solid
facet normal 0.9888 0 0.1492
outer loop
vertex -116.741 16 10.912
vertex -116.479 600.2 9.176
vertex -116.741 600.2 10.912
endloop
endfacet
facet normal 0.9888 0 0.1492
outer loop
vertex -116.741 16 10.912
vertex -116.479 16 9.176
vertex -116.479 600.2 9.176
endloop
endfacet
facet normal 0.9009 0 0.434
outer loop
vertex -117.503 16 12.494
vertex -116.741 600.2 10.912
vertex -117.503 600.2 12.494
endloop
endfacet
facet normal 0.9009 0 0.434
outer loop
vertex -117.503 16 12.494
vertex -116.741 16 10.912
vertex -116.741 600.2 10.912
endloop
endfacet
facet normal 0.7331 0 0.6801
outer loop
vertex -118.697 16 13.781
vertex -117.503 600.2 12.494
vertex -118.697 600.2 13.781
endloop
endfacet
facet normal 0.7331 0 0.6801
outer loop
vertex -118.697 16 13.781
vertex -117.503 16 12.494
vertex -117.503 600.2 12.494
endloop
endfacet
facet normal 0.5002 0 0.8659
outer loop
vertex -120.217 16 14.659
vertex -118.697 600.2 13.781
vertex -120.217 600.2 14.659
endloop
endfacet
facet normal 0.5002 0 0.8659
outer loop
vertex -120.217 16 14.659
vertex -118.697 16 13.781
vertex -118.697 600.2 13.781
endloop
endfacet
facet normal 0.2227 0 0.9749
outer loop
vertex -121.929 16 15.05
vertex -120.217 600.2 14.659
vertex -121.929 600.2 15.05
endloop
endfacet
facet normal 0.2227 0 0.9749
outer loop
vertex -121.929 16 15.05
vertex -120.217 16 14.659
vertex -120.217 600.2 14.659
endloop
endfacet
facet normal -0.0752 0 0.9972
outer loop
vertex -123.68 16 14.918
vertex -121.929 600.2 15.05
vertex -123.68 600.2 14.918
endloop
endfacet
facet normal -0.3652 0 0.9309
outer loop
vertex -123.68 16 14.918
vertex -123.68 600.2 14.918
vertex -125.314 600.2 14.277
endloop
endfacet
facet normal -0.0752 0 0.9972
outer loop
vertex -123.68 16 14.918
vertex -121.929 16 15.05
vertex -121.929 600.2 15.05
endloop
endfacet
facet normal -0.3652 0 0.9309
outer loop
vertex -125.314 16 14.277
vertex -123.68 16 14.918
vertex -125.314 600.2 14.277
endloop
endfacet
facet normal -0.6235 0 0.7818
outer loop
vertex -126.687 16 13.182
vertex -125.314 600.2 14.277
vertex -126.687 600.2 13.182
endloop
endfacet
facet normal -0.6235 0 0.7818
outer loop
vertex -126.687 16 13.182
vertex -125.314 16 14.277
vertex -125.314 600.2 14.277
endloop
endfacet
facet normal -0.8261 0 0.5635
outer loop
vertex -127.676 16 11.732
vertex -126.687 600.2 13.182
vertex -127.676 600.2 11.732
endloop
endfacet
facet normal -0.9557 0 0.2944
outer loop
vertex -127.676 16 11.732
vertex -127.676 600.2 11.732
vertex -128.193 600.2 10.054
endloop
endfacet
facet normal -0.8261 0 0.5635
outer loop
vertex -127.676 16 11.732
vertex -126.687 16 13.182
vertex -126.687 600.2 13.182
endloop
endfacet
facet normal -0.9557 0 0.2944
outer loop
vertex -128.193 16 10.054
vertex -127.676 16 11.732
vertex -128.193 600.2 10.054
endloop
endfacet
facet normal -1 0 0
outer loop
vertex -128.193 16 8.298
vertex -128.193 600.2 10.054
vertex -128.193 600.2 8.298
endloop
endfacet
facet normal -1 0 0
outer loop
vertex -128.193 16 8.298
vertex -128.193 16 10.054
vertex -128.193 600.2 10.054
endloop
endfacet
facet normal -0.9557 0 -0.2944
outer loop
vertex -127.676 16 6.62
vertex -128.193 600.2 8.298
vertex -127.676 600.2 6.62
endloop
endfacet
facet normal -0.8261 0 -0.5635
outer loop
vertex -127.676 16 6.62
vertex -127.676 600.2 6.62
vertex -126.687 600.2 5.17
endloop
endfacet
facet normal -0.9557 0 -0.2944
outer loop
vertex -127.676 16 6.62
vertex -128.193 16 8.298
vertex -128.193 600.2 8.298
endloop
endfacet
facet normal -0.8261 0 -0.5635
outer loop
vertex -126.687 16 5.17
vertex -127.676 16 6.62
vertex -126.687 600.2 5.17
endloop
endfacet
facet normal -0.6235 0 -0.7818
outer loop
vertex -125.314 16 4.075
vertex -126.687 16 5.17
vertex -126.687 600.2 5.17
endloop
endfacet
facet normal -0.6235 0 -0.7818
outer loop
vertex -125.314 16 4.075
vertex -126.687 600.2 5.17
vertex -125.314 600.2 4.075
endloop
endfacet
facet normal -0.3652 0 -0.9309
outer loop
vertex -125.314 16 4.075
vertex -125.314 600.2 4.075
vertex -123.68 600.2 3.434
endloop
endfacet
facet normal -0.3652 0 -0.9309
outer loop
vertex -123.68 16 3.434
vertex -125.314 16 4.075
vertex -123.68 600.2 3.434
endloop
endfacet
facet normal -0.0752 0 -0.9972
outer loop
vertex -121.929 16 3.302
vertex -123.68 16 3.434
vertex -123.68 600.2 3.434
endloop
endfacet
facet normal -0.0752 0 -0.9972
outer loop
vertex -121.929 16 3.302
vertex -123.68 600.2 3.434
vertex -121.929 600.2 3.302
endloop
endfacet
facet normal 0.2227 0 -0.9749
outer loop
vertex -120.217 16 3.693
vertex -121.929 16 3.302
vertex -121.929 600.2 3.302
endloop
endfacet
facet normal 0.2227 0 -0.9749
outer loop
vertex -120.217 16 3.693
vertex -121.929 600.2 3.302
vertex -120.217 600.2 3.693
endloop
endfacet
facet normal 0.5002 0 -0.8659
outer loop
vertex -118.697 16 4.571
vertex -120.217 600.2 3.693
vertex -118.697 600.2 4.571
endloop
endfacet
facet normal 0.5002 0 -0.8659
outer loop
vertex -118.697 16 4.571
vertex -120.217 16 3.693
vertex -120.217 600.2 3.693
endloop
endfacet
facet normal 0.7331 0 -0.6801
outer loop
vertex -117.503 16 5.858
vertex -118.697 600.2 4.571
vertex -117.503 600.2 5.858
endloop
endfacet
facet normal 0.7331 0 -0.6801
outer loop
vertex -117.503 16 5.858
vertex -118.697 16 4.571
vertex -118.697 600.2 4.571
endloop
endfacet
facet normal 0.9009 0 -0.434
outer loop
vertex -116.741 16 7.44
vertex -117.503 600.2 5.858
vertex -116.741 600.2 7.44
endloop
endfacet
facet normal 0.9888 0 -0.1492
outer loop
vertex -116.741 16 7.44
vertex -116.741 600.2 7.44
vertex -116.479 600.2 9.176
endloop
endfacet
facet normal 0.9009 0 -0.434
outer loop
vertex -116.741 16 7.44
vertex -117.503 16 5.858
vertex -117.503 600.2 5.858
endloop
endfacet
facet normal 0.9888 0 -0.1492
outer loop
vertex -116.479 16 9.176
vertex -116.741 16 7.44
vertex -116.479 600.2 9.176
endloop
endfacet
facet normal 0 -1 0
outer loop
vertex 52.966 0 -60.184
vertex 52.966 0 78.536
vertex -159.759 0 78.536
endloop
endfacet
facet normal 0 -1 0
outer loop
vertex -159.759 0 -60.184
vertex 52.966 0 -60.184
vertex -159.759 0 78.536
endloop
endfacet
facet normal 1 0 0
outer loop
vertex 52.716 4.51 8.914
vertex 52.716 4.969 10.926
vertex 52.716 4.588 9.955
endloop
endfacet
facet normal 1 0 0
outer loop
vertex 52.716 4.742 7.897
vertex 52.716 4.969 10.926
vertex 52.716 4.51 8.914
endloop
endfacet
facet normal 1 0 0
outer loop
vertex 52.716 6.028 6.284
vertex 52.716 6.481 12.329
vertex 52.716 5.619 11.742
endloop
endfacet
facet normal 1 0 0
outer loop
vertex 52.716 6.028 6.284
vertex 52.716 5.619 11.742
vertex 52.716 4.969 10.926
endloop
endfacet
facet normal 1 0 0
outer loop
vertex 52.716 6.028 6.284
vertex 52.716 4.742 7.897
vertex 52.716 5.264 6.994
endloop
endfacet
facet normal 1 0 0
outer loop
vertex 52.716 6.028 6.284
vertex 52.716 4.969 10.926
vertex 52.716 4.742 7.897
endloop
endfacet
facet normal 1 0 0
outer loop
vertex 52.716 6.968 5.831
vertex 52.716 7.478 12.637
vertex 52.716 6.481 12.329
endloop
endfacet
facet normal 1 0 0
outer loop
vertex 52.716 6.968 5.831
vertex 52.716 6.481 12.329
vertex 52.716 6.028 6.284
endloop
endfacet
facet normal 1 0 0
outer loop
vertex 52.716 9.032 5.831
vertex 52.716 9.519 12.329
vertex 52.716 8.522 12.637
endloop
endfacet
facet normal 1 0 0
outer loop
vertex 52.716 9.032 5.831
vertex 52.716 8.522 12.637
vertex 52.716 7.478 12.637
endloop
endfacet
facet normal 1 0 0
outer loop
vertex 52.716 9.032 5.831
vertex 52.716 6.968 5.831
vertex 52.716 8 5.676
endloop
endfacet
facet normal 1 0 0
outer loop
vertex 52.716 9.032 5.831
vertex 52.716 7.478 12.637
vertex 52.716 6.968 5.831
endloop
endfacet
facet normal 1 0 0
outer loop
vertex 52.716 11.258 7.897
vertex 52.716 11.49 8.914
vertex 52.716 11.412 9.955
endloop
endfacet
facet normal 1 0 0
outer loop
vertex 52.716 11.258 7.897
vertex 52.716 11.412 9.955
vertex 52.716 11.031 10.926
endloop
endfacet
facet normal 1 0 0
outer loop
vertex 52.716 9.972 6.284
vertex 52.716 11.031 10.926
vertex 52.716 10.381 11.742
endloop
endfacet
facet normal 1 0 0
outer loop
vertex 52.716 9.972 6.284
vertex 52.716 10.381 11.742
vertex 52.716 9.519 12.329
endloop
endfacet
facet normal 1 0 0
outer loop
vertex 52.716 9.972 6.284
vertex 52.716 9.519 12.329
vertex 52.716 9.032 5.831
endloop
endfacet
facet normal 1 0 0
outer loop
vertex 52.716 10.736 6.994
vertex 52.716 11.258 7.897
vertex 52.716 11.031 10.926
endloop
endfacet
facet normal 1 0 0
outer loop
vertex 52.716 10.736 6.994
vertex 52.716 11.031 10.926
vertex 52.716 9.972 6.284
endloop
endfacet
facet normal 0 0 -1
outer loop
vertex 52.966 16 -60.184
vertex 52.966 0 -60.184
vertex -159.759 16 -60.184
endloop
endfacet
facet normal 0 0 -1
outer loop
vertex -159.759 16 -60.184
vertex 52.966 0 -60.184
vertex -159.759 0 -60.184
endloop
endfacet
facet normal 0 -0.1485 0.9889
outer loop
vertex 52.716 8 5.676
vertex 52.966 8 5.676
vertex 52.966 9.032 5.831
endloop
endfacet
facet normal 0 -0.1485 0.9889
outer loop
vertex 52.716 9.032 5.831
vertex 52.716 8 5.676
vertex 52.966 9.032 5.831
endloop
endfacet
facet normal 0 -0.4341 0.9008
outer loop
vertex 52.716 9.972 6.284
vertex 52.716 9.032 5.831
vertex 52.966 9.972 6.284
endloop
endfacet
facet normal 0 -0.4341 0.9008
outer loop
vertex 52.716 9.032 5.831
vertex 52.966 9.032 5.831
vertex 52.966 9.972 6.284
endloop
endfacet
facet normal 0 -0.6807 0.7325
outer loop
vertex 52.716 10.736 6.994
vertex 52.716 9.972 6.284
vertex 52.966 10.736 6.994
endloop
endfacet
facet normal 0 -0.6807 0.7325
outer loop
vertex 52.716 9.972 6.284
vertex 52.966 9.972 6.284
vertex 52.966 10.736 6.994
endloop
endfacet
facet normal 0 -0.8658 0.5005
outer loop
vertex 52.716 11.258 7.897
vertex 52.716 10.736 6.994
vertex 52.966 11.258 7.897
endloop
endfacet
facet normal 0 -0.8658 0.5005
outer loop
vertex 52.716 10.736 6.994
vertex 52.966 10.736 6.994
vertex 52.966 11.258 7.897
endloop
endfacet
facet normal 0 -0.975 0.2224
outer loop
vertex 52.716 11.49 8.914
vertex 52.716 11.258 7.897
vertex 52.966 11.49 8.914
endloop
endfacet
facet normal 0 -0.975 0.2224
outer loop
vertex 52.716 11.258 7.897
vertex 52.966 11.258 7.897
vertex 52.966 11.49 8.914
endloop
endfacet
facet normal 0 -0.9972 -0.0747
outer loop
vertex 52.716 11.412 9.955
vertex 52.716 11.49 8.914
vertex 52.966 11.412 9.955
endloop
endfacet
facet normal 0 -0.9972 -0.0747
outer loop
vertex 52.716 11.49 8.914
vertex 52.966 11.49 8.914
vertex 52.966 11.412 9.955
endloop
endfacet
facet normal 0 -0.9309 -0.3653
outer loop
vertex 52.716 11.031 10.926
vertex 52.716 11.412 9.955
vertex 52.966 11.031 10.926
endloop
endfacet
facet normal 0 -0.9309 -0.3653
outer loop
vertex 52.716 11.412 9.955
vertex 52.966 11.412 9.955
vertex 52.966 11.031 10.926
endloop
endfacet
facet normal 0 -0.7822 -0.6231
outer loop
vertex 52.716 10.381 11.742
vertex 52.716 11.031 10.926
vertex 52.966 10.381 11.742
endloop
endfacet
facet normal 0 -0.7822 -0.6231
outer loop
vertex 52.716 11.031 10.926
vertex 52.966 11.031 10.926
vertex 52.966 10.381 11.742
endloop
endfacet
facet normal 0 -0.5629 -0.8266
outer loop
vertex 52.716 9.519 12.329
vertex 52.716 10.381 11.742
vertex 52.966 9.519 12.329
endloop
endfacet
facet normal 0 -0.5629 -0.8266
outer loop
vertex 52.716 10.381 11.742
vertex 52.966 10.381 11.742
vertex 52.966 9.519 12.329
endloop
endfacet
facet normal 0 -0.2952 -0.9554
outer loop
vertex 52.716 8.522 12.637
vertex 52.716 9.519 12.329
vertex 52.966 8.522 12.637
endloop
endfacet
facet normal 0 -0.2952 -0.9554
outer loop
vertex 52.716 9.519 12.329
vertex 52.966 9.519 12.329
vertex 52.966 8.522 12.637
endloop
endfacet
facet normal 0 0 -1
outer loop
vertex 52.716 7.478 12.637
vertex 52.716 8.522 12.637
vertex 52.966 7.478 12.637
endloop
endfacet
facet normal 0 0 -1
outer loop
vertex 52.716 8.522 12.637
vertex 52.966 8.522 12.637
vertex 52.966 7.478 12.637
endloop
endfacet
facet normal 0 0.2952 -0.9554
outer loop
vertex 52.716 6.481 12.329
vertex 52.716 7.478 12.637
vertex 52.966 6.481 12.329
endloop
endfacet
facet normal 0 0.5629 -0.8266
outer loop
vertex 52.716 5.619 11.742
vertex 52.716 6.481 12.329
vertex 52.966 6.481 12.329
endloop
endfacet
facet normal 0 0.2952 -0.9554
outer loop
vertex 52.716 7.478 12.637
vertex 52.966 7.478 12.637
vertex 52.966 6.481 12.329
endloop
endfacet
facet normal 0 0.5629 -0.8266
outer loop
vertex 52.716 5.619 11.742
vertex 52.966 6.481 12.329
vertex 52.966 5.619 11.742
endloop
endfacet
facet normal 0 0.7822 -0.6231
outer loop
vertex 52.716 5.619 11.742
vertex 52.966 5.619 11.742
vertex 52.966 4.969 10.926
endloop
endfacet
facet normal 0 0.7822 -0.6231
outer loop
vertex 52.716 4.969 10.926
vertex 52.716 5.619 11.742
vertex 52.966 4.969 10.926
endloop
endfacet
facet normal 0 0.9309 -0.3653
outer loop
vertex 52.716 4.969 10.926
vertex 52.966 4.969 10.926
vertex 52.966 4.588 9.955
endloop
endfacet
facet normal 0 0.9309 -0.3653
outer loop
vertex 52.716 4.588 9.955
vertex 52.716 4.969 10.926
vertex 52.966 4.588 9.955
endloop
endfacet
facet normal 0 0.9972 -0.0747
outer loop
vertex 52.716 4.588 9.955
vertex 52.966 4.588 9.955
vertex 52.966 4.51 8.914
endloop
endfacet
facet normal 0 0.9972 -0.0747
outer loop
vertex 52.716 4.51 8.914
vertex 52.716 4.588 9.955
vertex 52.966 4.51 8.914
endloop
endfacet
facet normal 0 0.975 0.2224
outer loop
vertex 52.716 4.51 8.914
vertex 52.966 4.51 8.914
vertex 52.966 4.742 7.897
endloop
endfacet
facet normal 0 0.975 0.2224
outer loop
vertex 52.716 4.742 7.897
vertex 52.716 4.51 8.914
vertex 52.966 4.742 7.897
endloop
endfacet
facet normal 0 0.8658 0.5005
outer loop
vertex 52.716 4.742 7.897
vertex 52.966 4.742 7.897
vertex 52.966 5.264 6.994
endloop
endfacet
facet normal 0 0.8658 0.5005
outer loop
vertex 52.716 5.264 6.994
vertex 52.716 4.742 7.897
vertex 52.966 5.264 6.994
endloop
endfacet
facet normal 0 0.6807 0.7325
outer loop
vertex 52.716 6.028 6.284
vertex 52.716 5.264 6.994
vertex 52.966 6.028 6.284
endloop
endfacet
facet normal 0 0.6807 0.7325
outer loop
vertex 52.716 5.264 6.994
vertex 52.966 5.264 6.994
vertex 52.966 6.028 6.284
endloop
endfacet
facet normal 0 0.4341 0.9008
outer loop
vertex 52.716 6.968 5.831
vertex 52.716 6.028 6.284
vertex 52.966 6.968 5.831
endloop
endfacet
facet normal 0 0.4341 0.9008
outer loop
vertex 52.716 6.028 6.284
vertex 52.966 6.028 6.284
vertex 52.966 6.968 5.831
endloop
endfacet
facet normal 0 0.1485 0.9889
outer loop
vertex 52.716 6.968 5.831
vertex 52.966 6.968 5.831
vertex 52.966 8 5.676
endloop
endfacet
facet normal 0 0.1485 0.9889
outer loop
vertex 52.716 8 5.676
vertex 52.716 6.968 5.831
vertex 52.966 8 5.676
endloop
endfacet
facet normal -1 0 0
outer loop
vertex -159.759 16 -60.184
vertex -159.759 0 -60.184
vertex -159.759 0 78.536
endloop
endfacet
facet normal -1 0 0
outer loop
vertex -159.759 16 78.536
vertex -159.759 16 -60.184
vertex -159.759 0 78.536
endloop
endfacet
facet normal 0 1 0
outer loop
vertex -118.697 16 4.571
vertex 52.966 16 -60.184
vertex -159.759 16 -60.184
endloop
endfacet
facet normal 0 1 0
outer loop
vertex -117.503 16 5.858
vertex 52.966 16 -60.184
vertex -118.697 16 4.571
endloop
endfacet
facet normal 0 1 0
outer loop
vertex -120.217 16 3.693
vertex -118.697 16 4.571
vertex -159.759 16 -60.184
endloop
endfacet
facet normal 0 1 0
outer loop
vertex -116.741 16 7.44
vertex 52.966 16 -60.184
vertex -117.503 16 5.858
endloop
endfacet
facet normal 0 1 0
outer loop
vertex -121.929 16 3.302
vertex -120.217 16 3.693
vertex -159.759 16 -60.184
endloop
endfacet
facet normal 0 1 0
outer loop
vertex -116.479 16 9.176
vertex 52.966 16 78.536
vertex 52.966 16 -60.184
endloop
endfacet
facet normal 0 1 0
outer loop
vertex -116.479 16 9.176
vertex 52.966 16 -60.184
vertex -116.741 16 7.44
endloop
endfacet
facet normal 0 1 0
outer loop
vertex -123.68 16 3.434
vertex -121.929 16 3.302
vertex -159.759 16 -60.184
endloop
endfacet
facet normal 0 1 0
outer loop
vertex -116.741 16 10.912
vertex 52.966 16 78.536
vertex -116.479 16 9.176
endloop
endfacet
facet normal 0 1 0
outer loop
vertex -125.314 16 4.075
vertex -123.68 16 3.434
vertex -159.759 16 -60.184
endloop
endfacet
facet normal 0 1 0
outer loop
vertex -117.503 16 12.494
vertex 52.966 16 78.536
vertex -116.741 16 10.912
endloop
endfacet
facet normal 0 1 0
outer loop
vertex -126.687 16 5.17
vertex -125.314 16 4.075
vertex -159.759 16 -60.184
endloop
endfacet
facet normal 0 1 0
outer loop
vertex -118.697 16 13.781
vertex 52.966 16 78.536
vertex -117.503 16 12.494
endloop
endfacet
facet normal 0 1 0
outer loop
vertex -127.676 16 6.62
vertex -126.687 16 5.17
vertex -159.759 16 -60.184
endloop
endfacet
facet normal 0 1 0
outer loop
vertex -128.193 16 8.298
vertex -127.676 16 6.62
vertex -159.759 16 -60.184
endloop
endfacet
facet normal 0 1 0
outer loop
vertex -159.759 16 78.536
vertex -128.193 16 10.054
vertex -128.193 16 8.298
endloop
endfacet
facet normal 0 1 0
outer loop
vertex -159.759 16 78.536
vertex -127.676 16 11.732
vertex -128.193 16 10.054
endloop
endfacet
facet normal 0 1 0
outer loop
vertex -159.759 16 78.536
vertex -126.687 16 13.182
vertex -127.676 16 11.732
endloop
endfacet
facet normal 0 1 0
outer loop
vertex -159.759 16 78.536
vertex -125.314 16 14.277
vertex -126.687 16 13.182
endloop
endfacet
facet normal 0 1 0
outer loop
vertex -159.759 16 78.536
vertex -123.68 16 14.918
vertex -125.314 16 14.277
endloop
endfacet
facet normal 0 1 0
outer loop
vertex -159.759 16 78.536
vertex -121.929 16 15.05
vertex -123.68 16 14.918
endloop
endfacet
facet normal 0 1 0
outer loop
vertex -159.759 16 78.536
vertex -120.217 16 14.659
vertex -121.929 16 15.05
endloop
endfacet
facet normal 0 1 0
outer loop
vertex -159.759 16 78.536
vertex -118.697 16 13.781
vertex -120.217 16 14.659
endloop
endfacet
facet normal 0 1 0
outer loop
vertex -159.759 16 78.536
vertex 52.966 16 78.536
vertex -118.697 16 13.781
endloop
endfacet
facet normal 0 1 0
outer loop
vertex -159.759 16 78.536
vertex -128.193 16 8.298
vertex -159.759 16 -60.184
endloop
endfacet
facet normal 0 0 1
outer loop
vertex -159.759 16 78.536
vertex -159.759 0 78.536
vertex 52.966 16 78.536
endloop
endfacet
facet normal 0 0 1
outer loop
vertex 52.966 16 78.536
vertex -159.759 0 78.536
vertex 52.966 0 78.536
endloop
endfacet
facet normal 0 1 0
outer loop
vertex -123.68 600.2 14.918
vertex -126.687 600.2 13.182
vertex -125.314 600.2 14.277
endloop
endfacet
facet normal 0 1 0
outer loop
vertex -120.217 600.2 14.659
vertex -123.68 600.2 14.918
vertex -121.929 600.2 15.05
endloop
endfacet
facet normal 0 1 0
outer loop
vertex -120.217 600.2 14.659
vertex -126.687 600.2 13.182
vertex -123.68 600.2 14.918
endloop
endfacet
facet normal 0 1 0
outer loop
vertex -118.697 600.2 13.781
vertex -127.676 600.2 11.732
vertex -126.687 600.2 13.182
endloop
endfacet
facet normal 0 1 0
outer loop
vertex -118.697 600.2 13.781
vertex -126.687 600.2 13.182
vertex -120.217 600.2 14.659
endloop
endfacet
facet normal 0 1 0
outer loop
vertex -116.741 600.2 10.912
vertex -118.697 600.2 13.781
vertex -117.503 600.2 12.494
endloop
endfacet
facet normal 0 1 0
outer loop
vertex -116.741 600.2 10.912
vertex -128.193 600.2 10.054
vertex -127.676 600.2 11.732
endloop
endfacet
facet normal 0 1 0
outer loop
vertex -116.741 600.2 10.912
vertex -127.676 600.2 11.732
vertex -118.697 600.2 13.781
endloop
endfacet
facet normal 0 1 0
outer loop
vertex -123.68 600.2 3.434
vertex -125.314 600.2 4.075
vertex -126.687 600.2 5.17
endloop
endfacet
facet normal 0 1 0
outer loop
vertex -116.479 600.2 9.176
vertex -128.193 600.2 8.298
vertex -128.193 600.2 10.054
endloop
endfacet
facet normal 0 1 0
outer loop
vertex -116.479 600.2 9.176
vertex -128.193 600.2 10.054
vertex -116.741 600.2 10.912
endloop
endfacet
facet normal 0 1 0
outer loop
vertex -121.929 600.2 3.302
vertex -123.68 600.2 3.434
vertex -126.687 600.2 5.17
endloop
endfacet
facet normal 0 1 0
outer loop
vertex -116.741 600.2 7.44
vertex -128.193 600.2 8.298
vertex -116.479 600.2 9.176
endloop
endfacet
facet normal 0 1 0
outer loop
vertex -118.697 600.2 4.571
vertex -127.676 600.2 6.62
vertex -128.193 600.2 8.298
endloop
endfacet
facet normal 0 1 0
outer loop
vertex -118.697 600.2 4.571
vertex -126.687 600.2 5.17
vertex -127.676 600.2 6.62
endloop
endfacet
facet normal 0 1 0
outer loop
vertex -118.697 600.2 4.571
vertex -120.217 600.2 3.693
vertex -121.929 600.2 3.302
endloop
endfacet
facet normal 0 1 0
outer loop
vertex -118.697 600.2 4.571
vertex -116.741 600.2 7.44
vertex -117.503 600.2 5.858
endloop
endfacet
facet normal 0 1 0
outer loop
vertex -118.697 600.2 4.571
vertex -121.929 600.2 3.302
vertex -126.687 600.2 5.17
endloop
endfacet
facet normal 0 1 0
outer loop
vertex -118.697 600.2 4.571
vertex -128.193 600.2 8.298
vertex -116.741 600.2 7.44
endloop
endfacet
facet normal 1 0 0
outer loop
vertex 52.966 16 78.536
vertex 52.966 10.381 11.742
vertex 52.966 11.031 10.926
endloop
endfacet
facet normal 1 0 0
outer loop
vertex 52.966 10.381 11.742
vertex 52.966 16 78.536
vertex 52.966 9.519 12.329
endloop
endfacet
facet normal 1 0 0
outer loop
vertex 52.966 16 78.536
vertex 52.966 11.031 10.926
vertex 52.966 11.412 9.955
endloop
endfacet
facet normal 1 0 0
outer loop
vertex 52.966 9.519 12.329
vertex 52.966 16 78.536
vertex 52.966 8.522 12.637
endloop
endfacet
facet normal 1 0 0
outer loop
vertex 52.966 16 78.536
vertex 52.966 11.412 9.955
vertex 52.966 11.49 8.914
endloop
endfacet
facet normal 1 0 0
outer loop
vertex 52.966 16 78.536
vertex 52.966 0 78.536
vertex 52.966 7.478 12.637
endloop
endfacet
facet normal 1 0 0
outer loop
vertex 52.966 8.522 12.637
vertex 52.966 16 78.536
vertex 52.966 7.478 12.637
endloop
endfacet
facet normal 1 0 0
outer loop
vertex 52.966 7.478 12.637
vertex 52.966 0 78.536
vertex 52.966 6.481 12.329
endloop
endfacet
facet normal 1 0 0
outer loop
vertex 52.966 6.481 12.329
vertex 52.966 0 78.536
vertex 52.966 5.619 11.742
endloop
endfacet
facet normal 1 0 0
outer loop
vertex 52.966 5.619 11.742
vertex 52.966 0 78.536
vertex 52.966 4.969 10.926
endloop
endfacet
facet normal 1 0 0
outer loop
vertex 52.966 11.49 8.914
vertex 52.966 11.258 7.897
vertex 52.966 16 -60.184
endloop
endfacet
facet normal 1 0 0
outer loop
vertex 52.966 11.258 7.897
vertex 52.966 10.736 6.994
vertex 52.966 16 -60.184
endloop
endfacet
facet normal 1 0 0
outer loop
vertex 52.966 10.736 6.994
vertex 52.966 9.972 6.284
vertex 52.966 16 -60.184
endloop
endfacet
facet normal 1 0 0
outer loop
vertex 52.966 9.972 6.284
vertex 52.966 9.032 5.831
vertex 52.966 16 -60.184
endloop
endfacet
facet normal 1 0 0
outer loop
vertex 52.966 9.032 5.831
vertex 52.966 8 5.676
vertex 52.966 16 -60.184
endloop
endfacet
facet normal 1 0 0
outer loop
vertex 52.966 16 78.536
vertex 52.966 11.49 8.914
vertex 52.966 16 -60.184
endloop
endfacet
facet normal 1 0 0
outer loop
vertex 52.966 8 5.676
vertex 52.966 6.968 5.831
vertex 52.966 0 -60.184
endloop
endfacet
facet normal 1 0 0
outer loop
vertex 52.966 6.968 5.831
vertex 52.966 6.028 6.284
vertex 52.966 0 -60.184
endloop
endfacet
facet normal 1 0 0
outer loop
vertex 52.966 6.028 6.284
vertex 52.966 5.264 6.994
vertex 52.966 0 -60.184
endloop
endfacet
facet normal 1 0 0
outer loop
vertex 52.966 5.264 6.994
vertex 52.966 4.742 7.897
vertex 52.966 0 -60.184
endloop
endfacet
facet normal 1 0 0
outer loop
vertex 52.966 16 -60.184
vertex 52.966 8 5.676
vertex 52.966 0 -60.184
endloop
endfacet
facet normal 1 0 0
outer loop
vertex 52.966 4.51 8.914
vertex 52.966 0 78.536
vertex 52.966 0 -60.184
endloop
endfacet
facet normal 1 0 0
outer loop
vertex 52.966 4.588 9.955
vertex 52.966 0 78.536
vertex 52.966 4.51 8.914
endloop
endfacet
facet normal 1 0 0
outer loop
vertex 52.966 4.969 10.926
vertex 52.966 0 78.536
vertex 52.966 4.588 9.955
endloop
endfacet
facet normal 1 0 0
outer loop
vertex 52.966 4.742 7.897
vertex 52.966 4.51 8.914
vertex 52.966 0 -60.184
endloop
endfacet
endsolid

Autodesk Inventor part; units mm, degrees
ref_plane "YZ Plane" through (0, 0, 0) normal (1, 0, 0) x (0, 1, 0)
ref_plane "XZ Plane" through (0, 0, 0) normal (0, 1, 0) x (-1, 0, 0)
ref_plane "XY Plane" through (0, 0, 0) normal (0, 0, 1) x (1, 0, 0)
sketch "Sketch1" plane through (0, 0, 0) normal (0, 1, 0) x (-1, 0, 0)
  line L0 (159.7591, 78.536) -> (-52.9659, 78.536)
  line L1 (-52.9659, 78.536) -> (-52.9659, -60.184)
  line L2 (-52.9659, -60.184) -> (159.7591, -60.184)
  line L3 (159.7591, -60.184) -> (159.7591, 78.536)
  point P0 (0, 0)
  dimension "d0" = 138.72
  dimension "d1" = 212.725
extrude "Extrusion1" add sketch "Sketch1" along normal blind 16
sketch "Sketch2" plane through (0, 16, 0) normal (0, 1, 0) x (1, 0, 0)
  line L0 (-159.7591, -78.536) -> (52.9659, -78.536) projected
  line L1 (52.9659, -78.536) -> (52.9659, 60.184) projected
  line L2 (52.9659, 60.184) -> (-159.7591, 60.184) projected
  line L3 (-159.7591, 60.184) -> (-159.7591, -78.536) projected
  line L4 (-159.7591, 60.184) -> (-159.7591, -78.536) projected
  line L5 (-159.7591, -9.176) -> (52.9659, -9.176)
  line L6 (52.9659, -78.536) -> (52.9659, 60.184) projected
  circle A0 centre (-122.3691, -9.176) radius 5.89
  line L7 (-122.3691, -9.176) -> (-128.2591, -9.176)
  point P0 (0, 0)
  dimension "d4" = 11.78
  dimension "d5" = 31.5
extrude "Extrusion2" add sketch "Sketch2" along normal blind 584.2 contours A0 L5 | L5 A0
sketch "Sketch3" plane through (52.9659, 0, 78.536) normal (1, 0, 0) x (0, 0, -1)
  line L0 (0, 0) -> (138.72, 0) projected
  line L1 (138.72, 0) -> (138.72, 16) projected
  line L2 (0, 16) -> (138.72, 16) projected
  line L3 (0, 0) -> (0, 16) projected
  line L4 (0, 8) -> (138.72, 8)
  circle A0 centre (69.36, 8) radius 3.5
  point P0 (78.536, 0)
  dimension "d8" = 7
extrude "Extrusion3" cut sketch "Sketch3" against normal blind 0.25 contours A0 L4 | L4 A0
properties part number "teststand"
